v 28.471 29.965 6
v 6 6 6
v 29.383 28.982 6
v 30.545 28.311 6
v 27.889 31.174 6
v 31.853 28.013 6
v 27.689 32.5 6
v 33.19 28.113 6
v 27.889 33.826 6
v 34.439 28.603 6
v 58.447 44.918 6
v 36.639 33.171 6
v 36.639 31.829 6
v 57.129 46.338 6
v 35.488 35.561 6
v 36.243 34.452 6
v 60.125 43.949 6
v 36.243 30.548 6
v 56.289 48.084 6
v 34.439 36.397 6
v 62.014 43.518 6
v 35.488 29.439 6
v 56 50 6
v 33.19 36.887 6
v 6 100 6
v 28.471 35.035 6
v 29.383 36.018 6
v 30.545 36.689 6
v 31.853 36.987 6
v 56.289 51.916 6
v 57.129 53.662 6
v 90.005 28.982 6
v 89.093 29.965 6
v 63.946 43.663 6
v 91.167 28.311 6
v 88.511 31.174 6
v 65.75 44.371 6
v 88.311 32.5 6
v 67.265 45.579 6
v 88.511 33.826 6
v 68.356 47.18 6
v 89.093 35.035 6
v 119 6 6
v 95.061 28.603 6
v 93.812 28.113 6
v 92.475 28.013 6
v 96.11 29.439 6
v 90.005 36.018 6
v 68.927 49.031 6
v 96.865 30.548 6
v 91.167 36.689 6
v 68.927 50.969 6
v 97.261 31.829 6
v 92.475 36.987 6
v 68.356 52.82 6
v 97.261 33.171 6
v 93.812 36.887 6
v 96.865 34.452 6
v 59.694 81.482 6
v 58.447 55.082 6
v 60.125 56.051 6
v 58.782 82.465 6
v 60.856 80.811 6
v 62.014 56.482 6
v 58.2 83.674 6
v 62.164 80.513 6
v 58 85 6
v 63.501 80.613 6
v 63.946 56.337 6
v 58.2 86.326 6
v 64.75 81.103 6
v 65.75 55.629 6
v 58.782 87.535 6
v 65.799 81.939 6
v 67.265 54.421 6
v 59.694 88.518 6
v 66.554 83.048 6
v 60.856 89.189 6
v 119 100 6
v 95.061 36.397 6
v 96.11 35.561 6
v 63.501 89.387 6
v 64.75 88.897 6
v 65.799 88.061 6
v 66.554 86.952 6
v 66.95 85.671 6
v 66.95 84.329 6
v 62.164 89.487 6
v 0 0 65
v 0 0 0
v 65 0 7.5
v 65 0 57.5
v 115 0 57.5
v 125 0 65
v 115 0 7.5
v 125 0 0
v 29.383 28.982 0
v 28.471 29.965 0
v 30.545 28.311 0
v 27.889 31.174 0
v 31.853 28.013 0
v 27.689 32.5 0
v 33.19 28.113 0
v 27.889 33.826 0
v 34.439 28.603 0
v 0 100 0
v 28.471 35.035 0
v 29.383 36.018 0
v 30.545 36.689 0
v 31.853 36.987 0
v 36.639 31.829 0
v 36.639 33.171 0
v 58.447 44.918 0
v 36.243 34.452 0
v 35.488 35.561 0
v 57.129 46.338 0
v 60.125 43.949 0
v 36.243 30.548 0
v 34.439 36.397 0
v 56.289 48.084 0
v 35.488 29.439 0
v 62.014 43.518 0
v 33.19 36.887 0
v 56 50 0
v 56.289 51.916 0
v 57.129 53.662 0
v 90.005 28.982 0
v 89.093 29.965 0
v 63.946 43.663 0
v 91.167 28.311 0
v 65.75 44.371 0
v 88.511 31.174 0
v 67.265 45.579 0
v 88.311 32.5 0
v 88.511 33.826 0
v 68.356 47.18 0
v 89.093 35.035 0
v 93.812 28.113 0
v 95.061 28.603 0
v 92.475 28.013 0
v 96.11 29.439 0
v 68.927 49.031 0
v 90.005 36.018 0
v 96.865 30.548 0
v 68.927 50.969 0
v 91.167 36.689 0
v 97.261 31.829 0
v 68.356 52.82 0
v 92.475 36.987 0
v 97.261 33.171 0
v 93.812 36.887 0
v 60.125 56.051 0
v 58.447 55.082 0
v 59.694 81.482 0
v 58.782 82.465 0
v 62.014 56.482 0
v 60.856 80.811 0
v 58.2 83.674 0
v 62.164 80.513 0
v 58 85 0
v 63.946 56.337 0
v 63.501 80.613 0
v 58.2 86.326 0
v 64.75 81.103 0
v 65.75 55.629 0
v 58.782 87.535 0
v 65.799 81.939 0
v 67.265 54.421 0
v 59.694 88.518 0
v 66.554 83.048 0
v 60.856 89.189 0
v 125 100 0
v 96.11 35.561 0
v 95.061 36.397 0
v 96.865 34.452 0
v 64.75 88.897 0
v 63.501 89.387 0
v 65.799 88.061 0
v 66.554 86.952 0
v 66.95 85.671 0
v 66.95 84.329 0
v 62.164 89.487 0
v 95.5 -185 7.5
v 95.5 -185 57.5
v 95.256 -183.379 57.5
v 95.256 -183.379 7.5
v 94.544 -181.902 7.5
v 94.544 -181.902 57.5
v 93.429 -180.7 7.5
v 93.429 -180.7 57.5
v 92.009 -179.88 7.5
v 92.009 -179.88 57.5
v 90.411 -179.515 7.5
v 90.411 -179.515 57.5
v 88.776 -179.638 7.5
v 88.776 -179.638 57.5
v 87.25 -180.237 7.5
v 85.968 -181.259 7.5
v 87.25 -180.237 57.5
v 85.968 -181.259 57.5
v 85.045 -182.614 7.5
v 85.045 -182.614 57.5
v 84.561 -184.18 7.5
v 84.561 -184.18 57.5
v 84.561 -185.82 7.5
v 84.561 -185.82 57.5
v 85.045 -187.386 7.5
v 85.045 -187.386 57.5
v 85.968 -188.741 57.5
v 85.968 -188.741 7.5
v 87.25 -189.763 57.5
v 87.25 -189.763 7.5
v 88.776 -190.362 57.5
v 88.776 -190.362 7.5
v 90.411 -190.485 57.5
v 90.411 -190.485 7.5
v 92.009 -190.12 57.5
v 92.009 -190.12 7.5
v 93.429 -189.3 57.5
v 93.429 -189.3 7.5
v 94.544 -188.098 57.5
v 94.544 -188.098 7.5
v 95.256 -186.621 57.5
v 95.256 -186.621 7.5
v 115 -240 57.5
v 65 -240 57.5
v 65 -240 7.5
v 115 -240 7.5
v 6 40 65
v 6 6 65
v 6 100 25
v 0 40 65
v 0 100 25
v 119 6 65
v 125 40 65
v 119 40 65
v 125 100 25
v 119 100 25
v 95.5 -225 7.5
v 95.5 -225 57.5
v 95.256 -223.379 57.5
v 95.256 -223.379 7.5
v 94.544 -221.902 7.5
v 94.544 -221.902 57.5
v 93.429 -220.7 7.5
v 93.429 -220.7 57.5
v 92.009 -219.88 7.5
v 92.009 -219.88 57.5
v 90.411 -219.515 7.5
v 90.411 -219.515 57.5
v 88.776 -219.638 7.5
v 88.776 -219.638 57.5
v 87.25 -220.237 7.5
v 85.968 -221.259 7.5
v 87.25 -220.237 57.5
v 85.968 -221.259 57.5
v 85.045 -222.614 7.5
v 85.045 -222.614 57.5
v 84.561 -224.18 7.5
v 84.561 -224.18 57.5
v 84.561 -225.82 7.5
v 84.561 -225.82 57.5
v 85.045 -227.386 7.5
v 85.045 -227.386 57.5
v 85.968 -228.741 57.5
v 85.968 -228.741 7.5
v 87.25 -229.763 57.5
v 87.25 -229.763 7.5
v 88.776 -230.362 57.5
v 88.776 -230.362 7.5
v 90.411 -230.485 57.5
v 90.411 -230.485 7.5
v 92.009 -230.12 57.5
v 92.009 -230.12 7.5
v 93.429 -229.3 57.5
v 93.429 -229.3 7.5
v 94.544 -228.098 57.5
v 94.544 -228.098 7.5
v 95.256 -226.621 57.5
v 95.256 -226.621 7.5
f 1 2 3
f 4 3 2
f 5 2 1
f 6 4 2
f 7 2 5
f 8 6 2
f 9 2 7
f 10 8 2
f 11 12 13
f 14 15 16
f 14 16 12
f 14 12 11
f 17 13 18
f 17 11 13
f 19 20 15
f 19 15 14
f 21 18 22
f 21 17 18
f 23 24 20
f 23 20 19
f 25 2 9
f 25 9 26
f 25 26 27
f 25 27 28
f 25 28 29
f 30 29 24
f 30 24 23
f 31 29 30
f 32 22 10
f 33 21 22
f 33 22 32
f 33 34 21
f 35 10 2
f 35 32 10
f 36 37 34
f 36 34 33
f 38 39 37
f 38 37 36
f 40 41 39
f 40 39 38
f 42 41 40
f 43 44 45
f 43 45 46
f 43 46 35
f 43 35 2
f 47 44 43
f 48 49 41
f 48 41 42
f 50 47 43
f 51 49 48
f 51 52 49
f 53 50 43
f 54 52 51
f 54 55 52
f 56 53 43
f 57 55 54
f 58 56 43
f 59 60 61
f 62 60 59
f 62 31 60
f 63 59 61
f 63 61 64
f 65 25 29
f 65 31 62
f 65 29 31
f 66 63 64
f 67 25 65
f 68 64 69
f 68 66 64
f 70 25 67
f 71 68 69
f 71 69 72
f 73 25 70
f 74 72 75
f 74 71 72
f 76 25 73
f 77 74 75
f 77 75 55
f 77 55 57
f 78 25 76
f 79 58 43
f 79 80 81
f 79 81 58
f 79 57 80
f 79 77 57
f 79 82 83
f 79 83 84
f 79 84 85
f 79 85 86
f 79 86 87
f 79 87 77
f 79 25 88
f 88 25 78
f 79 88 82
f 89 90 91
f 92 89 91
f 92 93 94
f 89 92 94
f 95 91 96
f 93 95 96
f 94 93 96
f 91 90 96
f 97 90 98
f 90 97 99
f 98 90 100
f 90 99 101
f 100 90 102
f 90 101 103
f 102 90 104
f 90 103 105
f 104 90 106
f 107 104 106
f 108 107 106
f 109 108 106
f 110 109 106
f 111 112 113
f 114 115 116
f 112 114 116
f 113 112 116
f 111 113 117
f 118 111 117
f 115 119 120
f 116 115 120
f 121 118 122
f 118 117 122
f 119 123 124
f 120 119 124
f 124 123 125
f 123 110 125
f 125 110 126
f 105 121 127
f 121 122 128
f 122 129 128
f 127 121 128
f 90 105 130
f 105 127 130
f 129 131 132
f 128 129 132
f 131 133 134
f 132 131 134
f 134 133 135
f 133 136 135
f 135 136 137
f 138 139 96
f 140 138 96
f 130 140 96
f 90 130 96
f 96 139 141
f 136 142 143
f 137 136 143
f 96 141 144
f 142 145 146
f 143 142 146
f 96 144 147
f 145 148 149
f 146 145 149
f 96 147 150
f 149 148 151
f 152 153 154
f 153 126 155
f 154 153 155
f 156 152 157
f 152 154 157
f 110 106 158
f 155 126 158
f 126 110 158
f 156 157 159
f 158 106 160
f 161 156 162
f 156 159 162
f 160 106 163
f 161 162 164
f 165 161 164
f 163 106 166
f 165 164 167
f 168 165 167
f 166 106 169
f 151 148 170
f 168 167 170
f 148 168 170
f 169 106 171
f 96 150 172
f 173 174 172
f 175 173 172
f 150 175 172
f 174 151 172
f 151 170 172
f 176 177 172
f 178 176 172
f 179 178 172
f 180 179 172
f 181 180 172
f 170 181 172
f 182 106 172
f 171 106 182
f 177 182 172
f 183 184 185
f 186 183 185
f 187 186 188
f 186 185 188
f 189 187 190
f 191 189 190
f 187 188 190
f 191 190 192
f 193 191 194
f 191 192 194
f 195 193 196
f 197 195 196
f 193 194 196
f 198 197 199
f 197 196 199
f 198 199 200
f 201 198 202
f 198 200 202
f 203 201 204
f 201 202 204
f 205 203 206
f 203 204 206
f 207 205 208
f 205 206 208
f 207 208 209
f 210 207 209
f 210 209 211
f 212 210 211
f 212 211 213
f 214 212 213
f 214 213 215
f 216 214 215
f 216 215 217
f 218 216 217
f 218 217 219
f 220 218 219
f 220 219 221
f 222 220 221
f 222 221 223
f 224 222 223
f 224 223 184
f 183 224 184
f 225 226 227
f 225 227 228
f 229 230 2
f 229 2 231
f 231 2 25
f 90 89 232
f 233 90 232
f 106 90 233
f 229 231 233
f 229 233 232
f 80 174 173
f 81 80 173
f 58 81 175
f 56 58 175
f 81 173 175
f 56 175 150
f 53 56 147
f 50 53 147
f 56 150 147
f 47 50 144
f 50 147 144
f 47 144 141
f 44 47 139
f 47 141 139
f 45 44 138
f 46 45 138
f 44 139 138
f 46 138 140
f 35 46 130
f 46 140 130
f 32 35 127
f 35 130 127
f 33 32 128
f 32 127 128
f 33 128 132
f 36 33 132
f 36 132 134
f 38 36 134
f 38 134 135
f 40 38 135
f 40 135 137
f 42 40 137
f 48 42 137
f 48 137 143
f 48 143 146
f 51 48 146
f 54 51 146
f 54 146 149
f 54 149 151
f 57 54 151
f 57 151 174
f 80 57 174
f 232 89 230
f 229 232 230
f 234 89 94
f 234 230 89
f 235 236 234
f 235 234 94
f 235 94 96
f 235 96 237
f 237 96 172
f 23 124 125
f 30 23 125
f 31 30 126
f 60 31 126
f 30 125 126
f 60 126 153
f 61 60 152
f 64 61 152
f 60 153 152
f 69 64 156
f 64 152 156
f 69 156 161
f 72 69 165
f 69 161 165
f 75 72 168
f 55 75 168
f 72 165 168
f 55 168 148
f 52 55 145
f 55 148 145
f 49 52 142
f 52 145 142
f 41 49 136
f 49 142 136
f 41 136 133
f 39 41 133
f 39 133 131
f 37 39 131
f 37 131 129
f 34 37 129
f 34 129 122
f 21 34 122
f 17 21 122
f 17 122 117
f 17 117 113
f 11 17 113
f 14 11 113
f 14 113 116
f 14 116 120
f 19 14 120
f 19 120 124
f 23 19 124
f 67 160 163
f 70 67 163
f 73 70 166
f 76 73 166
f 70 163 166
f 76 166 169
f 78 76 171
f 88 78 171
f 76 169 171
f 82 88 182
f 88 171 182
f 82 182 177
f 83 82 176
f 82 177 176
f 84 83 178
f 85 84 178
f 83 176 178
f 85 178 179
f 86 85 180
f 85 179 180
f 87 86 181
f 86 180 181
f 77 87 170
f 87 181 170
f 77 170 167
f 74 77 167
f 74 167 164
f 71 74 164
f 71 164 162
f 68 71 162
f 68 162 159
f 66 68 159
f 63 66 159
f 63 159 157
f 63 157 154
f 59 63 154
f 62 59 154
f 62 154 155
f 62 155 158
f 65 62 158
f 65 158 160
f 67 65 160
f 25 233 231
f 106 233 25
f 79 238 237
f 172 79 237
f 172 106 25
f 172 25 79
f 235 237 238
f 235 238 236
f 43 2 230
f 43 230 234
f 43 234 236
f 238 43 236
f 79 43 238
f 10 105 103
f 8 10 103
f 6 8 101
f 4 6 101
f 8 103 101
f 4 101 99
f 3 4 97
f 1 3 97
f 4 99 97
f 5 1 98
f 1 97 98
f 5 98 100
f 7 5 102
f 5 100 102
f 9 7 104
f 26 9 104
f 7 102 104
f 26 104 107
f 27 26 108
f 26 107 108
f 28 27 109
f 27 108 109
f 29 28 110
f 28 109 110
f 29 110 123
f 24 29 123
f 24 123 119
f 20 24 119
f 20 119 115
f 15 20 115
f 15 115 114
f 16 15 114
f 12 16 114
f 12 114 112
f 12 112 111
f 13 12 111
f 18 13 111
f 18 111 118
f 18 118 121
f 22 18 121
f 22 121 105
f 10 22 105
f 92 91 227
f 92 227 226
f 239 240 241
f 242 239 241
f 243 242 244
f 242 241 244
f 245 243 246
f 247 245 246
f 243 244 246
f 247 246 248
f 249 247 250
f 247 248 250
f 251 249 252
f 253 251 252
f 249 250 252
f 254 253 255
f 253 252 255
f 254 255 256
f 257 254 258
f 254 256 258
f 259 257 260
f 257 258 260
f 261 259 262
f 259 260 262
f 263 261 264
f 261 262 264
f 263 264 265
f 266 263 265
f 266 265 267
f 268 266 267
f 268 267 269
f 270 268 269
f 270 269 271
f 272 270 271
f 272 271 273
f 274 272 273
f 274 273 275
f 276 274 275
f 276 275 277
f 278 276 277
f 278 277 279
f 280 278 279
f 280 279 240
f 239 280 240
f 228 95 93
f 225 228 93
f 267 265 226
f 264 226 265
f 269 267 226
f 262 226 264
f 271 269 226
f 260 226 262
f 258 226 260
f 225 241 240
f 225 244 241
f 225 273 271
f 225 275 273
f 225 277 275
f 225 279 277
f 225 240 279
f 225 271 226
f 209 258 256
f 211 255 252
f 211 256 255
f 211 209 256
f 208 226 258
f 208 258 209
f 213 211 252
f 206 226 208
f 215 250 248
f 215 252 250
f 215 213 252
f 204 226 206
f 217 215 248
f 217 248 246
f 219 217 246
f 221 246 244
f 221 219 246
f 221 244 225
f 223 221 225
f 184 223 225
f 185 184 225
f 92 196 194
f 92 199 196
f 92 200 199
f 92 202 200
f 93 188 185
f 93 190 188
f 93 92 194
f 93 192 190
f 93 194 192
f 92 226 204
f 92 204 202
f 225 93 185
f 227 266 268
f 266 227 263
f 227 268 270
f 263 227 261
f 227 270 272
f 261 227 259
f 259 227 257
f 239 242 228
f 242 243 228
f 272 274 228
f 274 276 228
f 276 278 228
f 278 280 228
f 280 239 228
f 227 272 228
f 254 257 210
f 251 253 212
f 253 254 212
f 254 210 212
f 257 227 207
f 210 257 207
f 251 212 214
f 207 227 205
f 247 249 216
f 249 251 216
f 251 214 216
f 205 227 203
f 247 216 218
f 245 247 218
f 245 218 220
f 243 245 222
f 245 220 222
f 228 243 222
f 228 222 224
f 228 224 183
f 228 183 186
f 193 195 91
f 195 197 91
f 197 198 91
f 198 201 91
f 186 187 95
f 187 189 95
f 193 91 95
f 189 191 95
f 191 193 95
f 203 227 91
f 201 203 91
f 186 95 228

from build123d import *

# Parameters (mm, degrees)
SKETCH_1_W               = 125
SKETCH_1_H               = 100
EXTRUDE_1_DEPTH          = 65
SHELL_1_T                = -6
CUT_EXTRUDE_1_REACH      = 174.772
SKETCH_3_W               = 50
SKETCH_3_H               = 50
EXTRUDE_2_DEPTH          = 240
SKETCH_4_R               = 5.5
CUT_EXTRUDE_2_DEPTH      = 240
SKETCH_5_R               = 6.5
CUT_EXTRUDE_5_DEPTH      = 240
SKETCH_6_R               = 4.5
CUT_EXTRUDE_6_DEPTH      = 240
PATTERN_CIRCULAR_1_COUNT = 3


with BuildPart() as part:
    # 草图1 → 凸台-拉伸1 (new body)
    with BuildSketch(Plane.XY):
        with Locations((62.5, 50)):
            Rectangle(SKETCH_1_W, SKETCH_1_H)
    extrude(amount=EXTRUDE_1_DEPTH)

    # 抽壳1
    shell_1_openings = [part.faces().sort_by_distance(p)[0] for p in [
        (62.5, 50, 65),
        (62.5, 100, 32.5),
    ]]
    offset(amount=SHELL_1_T, openings=shell_1_openings, kind=Kind.INTERSECTION)

    # 切除-拉伸1: up to this face of the body (flat: up to its plane)
    cut_extrude_1_end = Plane(part.part.faces().sort_by_distance((0, 50, 32.5))[0])
    # 草图2 → 切除-拉伸1 (cut, up to the picked face)
    with BuildSketch(Plane(origin=(125, 0, 0), x_dir=(0, 0, -1), z_dir=(1, 0, 0)), mode=Mode.PRIVATE) as cut_extrude_1_sk1:
        Polygon((-65, 100), (-25, 100), (-65, 40), align=None)
    cut_extrude_1_tool1 = split(extrude(cut_extrude_1_sk1.sketch, amount=-CUT_EXTRUDE_1_REACH, mode=Mode.PRIVATE), bisect_by=cut_extrude_1_end, keep=Keep.BOTH, mode=Mode.PRIVATE)
    add(cut_extrude_1_tool1.solids().sort_by(Axis((125, 80, 51.666667), (-1, 0, 0)))[0], mode=Mode.SUBTRACT)

    # 草图3 → 凸台-拉伸2 (add)
    with BuildSketch(Plane.XZ):
        with Locations((90, 32.5)):
            Rectangle(SKETCH_3_W, SKETCH_3_H)
    extrude(amount=EXTRUDE_2_DEPTH)

    # 草图4 → 切除-拉伸2 (cut)
    with BuildSketch(Plane.XY.offset(57.5)):
        with Locations((90, -225)):
            Circle(SKETCH_4_R)
        with Locations((90, -185)):
            Circle(SKETCH_4_R)
    extrude(amount=-CUT_EXTRUDE_2_DEPTH, mode=Mode.SUBTRACT)

    # 草图5 → 切除-拉伸5 (cut)
    with BuildSketch(Plane(origin=(0, 0, 0), x_dir=(-1, 0, 0), z_dir=(0, 0, -1))):
        with Locations((-62.5, 50)):
            Circle(SKETCH_5_R)
    extrude(amount=-CUT_EXTRUDE_5_DEPTH, mode=Mode.SUBTRACT)

    # 草图6 → 切除-拉伸6 (cut)
    with BuildSketch(Plane(origin=(0, 0, 0), x_dir=(-1, 0, 0), z_dir=(0, 0, -1))):
        with Locations((-62.5, 85)):
            Circle(SKETCH_6_R)
    cut_extrude_6 = extrude(amount=-CUT_EXTRUDE_6_DEPTH, mode=Mode.SUBTRACT)

    # 阵列(圆周)1: 切除-拉伸6 ×3 about axis
    pattern_circular_1_axis = Axis((62.5, 50, 0), (0, 0, 1))
    for i in range(1, PATTERN_CIRCULAR_1_COUNT):
        add(cut_extrude_6.rotate(pattern_circular_1_axis, i * 360 / PATTERN_CIRCULAR_1_COUNT), mode=Mode.SUBTRACT)


solid = part.part
